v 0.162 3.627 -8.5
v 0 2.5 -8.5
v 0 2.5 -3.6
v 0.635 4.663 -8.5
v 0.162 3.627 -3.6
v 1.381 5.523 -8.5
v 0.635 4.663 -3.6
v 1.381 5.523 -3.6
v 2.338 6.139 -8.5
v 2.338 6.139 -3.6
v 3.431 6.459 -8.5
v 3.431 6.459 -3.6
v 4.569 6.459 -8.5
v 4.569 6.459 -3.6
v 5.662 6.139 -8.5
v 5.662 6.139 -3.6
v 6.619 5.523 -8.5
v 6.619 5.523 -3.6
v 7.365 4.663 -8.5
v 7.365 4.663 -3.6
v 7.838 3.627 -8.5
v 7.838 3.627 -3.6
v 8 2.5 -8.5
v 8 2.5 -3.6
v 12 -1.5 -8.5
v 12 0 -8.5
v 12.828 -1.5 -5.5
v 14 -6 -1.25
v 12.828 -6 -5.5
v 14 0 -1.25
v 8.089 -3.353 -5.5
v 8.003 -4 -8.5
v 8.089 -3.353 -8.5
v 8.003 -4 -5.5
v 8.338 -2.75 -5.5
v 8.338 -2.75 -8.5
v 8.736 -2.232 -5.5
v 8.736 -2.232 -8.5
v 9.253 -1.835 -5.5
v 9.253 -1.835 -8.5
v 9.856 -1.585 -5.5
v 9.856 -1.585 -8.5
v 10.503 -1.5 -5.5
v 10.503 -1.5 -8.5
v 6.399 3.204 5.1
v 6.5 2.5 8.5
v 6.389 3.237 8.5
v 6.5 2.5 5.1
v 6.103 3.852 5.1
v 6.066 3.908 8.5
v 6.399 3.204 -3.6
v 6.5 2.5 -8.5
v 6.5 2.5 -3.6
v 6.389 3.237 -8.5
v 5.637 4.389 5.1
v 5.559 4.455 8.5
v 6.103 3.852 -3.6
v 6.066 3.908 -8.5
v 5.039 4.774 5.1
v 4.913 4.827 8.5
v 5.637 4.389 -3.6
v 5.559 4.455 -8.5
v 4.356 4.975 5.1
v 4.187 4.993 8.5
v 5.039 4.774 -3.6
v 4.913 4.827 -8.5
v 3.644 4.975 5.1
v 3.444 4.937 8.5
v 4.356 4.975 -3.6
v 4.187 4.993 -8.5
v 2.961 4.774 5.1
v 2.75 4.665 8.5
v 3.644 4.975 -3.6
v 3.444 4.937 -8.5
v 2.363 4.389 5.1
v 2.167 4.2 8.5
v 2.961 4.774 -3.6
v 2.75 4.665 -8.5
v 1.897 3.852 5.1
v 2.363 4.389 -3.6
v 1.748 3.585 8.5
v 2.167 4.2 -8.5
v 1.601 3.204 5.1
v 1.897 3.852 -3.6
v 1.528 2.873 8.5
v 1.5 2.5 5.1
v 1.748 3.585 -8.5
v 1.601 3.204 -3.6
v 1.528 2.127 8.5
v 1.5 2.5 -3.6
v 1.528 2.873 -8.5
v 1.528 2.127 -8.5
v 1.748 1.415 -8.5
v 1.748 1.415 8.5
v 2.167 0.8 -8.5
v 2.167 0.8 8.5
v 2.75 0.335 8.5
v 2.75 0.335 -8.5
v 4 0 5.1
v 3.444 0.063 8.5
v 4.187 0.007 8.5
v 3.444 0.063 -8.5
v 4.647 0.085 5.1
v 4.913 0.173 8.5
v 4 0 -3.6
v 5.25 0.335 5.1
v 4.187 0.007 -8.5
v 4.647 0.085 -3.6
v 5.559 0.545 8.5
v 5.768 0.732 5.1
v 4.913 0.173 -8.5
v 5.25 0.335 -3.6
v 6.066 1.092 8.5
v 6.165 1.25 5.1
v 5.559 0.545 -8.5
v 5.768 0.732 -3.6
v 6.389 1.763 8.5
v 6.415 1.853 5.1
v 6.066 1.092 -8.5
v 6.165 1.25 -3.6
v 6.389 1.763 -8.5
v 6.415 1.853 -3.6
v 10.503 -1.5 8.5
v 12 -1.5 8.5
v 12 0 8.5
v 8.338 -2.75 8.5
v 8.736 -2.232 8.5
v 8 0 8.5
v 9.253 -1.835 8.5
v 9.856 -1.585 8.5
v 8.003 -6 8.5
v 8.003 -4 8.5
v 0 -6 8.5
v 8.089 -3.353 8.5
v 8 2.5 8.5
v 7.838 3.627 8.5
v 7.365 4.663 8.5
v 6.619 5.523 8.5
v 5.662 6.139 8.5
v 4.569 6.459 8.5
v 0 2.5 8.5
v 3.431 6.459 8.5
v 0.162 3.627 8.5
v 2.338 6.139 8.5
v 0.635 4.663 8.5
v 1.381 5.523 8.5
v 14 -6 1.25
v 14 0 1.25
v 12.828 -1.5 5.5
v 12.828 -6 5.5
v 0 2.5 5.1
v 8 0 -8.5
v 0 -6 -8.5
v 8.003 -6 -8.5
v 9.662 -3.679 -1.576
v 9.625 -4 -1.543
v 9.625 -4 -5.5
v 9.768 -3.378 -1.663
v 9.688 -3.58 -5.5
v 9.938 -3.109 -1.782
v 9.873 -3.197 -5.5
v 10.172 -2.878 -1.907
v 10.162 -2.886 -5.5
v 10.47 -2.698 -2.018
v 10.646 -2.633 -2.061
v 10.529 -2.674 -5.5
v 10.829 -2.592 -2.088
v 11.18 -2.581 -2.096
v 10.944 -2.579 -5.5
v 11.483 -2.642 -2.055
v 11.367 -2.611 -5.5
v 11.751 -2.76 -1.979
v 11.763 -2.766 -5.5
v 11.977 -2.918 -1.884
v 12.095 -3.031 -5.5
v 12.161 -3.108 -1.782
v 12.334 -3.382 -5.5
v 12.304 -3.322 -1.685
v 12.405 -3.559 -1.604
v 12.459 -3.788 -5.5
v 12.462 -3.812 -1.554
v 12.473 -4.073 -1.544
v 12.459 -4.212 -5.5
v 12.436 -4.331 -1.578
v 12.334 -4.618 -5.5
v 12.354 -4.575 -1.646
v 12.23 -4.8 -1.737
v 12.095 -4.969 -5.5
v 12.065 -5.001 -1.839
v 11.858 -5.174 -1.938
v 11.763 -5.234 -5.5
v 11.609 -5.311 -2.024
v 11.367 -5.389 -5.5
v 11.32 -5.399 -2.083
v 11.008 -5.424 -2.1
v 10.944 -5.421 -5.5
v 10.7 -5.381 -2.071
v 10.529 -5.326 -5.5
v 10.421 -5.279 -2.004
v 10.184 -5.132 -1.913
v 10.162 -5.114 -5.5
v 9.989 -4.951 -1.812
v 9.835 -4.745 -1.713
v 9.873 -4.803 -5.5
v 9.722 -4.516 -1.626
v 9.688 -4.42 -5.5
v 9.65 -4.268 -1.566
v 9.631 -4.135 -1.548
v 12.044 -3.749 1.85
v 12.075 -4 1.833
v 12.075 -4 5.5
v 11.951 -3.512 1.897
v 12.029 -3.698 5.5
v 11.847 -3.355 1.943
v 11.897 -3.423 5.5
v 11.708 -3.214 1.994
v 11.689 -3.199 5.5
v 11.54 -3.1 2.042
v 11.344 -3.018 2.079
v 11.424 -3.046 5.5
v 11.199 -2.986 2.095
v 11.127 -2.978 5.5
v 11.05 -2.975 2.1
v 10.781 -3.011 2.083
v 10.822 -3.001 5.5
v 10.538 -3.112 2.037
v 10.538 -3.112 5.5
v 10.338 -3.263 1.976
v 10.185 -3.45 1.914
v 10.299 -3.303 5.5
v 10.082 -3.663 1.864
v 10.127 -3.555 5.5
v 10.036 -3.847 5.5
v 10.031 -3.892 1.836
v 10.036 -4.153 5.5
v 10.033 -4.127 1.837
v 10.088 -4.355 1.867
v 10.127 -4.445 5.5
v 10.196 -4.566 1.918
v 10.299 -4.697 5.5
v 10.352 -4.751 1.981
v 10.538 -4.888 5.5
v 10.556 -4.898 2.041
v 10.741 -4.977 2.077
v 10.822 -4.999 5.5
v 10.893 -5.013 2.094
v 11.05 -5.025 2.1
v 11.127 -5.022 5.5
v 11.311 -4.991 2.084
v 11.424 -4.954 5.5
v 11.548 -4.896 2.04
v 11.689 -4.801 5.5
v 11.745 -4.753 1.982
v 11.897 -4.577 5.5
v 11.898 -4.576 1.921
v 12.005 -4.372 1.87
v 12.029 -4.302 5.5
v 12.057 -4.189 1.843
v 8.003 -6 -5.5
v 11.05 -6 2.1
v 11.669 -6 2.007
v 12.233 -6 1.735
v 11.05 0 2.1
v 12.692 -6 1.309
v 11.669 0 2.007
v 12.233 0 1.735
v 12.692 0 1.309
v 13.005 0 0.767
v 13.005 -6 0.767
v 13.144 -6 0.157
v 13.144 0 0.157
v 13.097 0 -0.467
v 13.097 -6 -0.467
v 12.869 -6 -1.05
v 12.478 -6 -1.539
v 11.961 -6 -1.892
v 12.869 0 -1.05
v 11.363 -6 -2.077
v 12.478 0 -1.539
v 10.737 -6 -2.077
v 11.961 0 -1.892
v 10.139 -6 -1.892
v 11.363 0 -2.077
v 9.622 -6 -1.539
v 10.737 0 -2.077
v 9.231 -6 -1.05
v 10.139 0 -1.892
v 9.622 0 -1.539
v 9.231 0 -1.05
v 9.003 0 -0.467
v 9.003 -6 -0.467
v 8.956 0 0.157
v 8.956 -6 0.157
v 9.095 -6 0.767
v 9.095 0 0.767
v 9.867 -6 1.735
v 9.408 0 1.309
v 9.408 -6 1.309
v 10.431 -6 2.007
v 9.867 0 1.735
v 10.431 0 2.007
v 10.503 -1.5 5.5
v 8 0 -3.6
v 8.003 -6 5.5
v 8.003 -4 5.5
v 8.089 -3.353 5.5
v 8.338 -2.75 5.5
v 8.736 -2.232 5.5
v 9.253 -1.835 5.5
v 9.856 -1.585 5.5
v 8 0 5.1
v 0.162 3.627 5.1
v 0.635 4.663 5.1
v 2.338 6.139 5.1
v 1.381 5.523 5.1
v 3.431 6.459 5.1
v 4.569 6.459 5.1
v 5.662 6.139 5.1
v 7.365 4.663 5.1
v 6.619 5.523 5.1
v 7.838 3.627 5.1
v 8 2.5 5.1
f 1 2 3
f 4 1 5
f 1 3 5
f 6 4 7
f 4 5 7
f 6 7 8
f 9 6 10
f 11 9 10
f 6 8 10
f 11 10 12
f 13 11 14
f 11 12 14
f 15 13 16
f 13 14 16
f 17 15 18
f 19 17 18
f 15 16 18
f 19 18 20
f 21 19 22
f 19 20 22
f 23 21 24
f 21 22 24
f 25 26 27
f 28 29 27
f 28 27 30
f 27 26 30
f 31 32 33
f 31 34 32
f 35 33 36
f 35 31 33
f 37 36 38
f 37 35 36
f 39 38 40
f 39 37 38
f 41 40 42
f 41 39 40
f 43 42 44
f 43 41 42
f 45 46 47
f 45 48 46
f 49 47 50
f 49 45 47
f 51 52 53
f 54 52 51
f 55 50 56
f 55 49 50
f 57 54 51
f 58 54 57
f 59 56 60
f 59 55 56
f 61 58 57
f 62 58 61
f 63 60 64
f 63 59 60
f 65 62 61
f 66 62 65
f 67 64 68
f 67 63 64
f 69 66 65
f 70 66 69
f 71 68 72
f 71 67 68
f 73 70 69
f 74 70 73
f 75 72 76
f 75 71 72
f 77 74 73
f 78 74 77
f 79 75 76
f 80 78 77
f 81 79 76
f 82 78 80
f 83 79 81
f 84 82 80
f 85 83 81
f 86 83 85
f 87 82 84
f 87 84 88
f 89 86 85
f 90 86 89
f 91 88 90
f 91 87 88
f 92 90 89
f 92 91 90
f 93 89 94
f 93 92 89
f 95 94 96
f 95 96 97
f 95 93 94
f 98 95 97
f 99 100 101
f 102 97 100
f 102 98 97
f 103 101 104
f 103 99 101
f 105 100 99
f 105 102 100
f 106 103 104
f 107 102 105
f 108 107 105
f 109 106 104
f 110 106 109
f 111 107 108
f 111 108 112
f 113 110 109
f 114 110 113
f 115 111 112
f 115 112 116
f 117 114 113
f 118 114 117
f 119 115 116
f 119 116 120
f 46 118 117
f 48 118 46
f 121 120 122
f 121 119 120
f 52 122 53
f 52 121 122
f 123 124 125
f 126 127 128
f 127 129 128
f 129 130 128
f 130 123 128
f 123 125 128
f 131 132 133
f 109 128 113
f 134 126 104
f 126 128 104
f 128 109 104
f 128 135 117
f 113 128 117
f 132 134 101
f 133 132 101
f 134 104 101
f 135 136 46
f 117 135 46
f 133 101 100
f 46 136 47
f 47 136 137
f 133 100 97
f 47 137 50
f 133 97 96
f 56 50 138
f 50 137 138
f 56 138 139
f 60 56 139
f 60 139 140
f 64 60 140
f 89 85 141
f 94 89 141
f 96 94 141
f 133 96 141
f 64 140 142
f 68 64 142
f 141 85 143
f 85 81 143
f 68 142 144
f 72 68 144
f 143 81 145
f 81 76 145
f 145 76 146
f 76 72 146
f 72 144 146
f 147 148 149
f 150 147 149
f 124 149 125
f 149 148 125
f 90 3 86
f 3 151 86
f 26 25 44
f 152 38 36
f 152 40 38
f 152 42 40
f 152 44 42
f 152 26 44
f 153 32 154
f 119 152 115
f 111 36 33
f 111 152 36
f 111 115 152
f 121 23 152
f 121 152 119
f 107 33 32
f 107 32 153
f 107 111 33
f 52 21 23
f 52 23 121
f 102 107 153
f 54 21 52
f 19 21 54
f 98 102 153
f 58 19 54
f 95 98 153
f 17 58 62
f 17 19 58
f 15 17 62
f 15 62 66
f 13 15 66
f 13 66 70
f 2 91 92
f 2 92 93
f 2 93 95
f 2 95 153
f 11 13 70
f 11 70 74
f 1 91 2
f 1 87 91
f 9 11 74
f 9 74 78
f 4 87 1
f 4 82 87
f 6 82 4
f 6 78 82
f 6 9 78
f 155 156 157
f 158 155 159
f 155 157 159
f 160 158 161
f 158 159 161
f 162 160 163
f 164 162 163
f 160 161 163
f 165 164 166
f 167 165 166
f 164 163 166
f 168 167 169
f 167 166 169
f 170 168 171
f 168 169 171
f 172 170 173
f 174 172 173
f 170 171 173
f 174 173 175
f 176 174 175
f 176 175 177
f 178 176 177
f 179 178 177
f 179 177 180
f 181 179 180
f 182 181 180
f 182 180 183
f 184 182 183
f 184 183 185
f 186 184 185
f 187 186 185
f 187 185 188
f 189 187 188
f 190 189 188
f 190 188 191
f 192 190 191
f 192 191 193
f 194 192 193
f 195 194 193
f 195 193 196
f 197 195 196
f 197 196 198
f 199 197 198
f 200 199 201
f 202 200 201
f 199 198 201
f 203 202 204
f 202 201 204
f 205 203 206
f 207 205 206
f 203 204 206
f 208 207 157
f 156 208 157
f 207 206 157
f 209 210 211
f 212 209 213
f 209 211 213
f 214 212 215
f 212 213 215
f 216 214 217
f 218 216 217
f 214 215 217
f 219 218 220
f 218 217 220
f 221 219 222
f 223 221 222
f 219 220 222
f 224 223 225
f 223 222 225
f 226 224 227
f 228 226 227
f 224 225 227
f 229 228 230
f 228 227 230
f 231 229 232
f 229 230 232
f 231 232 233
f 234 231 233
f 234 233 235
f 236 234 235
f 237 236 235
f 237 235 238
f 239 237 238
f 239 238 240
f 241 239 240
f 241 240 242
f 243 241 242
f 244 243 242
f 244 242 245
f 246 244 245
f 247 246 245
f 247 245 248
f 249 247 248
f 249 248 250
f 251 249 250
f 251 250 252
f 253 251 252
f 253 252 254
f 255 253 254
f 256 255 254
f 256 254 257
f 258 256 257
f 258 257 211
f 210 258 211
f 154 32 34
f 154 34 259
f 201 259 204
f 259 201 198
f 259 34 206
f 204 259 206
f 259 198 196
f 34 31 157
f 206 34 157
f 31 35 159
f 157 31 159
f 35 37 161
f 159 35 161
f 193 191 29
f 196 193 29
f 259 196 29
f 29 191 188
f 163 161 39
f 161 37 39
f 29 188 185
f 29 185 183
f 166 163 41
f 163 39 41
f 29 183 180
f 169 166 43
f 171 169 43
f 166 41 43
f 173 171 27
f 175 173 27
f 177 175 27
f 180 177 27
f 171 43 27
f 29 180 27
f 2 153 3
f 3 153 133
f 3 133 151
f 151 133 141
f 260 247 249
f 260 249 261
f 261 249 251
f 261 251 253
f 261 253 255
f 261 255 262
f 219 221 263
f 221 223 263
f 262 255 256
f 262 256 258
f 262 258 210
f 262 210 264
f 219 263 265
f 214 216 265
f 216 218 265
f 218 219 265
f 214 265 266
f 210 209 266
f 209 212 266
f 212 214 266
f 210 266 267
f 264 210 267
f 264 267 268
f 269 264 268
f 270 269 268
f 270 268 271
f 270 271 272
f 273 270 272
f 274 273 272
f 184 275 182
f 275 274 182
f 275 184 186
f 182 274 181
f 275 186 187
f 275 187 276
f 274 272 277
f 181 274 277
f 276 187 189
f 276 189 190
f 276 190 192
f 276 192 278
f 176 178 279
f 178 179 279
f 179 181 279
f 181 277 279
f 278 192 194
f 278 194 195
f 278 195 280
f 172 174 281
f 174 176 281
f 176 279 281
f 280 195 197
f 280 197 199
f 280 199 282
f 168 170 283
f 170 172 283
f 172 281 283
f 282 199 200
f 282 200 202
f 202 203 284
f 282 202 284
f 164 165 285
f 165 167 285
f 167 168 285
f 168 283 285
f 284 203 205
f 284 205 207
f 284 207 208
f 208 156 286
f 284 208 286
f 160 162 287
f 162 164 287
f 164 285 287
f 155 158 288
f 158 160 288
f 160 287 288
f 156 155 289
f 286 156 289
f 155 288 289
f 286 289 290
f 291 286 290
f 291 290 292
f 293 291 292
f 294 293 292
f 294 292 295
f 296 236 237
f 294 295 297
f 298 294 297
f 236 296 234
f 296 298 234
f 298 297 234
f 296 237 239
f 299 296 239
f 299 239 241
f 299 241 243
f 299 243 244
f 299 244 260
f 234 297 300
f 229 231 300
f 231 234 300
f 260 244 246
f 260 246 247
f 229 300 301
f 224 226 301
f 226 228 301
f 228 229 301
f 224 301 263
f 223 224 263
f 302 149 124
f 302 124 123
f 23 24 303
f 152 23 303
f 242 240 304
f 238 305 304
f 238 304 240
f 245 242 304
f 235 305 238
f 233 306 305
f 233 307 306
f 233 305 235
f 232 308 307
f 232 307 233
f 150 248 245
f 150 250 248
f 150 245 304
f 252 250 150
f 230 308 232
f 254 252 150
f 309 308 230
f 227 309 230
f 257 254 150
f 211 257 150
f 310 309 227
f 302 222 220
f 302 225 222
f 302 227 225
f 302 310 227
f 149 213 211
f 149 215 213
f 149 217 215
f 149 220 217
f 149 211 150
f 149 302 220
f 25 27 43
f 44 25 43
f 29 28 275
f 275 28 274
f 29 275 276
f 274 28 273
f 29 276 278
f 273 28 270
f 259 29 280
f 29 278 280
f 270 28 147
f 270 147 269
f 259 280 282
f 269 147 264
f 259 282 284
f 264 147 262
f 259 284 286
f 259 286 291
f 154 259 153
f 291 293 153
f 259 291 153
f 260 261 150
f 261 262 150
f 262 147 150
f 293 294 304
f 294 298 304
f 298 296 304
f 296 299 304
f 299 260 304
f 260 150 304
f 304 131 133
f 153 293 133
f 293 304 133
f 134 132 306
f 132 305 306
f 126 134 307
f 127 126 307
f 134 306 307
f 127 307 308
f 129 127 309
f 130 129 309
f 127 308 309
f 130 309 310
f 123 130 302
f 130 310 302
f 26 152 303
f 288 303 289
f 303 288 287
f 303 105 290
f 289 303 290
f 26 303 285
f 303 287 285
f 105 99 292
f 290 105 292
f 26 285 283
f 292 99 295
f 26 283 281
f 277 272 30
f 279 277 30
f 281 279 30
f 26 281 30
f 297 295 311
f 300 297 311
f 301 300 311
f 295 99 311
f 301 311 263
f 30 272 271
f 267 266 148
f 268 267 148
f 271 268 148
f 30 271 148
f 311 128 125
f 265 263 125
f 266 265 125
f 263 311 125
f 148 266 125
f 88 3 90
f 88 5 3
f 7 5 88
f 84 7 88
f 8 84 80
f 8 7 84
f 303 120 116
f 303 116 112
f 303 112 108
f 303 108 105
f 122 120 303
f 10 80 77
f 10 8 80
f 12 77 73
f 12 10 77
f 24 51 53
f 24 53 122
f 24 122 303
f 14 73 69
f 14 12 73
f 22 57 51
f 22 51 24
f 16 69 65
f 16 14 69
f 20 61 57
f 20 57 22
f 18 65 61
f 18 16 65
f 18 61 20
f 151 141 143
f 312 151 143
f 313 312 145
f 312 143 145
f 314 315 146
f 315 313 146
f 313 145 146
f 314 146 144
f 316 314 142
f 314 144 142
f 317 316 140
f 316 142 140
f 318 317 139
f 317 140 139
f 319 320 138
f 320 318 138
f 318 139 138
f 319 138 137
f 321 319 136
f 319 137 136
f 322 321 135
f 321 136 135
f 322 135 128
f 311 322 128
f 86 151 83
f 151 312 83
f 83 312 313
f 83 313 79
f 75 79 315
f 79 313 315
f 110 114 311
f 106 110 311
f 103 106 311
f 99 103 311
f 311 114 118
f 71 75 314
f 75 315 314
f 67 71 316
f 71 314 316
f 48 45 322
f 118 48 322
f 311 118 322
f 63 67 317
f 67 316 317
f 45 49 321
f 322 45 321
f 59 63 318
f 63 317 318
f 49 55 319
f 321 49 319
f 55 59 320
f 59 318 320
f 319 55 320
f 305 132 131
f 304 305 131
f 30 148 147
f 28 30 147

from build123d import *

# Parameters (mm, degrees)
SKETCH_1_R                = 2.5
EXTRUDE_1_DEPTH           = 8.5
CUT_EXTRUDE_1_DEPTH       = 17
CUT_EXTRUDE_2_DEPTH       = 3
FILLET_1_R                = 2.5
FILLET_1_OF_MIRROR_1_R    = 2.5
CUT_EXTRUDE_3_REACH       = 19.621
SKETCH_4_R                = 2.1
HOLE_WIZARD_M2_5_1_REACH  = 22.839
HOLE_WIZARD_M2_5_1_BORE_R = 1.025
CUT_EXTRUDE_4_REACH       = 22.839
CUT_EXTRUDE_4_END_RADIUS  = 2.1
SKETCH_9_R                = 1.425
CUT_EXTRUDE_5_DEPTH       = 5.1
CUT_EXTRUDE_6_DEPTH       = 3.6


with BuildPart() as part:
    # 草图1 → 凸台-拉伸1 (new, symmetric)
    with BuildSketch(Plane.XY):
        with BuildLine():
            Line((0, 0), (0, 2.5))
            ThreePointArc((0, 2.5), (4, 6.5), (8, 2.5))
            Line((8, 2.5), (8, 0))
            Line((8, 0), (14, 0))
            Line((14, 0), (14, -6))
            Line((14, -6), (0, -6))
            Line((0, -6), (0, 0))
        make_face()
        with Locations((4, 2.5)):
            Circle(SKETCH_1_R, mode=Mode.SUBTRACT)
    extrude(amount=EXTRUDE_1_DEPTH, both=True)

    # 草图2 → 切除-拉伸1 (cut)
    with BuildSketch(Plane(origin=(0, 0, 0), x_dir=(1, 0, 0), z_dir=(0, 1, 0))):
        Polygon((12, 8.5), (14, 1.25), (14, 8.5), align=None)
        Polygon((14, -8.5), (14, -1.25), (12, -8.5), align=None)
    extrude(amount=-CUT_EXTRUDE_1_DEPTH, mode=Mode.SUBTRACT)

    # 草图3 → 切除-拉伸2 (cut)
    with BuildSketch(Plane.XY.offset(8.5)):
        Polygon((12, -1.5), (8.003412896, -1.5), (8.003412896, -6), (8.003412896, -6.782168113), (14.44734693, -6.782168113), (14.44734693, -1.5), align=None)
    cut_extrude_2 = extrude(amount=-CUT_EXTRUDE_2_DEPTH, mode=Mode.SUBTRACT)

    # 圆角1
    fillet_1_edges = [part.edges().sort_by_distance(p)[0] for p in [
        (8.003412896, -1.5, 7),
    ]]
    fillet(fillet_1_edges, radius=FILLET_1_R)

    # 镜向1: 切除-拉伸2 across plane
    add(cut_extrude_2.mirror(Plane.XY), mode=Mode.SUBTRACT)

    # 圆角1 of 镜向1
    fillet_1_of_mirror_1_edges = [part.edges().sort_by_distance(p)[0] for p in [
        (8.003412896, -1.5, -7),
    ]]
    fillet(fillet_1_of_mirror_1_edges, radius=FILLET_1_OF_MIRROR_1_R)

    # 草图4 → 切除-拉伸3 (cut, up to next)
    with BuildSketch(Plane(origin=(0, 0, 0), x_dir=(1, 0, 0), z_dir=(0, 1, 0)), mode=Mode.PRIVATE) as cut_extrude_3_sk1:
        with Locations(Location((11.05, 0, 0), (0, 0, 270))):
            Circle(SKETCH_4_R)
    cut_extrude_3_tool1 = extrude(cut_extrude_3_sk1.sketch, amount=-CUT_EXTRUDE_3_REACH, mode=Mode.PRIVATE) & part.part
    add(cut_extrude_3_tool1.solids().sort_by_distance((11.05, 0, 0))[0], mode=Mode.SUBTRACT)

    # M2.5 螺纹孔1 bore → M2.5 螺纹孔1 (cut, up to next)
    with BuildSketch(Plane.XY.offset(5.5), mode=Mode.PRIVATE) as hole_wizard_m2_5_1_sk1:
        with Locations((11.05, -4)):
            Circle(HOLE_WIZARD_M2_5_1_BORE_R)
    hole_wizard_m2_5_1_tool1 = extrude(hole_wizard_m2_5_1_sk1.sketch, amount=-HOLE_WIZARD_M2_5_1_REACH, mode=Mode.PRIVATE) & part.part
    add(hole_wizard_m2_5_1_tool1.solids().sort_by_distance((11.05, -4, 5.5))[0], mode=Mode.SUBTRACT)

    # 切除-拉伸4: up to this cylinder (the profile starts outside it)
    cut_extrude_4_end = Plane(origin=(11.05, -4, 0), z_dir=(0, 1, 0)) * Cylinder(CUT_EXTRUDE_4_END_RADIUS, 50.878, mode=Mode.PRIVATE)
    # 草图9 → 切除-拉伸4 (cut, up to the surface)
    with BuildSketch(Plane(origin=(0, 0, -5.5), x_dir=(-1, 0, 0), z_dir=(0, 0, -1)), mode=Mode.PRIVATE) as cut_extrude_4_sk1:
        with Locations((-11.05, -4)):
            Circle(SKETCH_9_R)
    cut_extrude_4_tool1 = extrude(cut_extrude_4_sk1.sketch, amount=-CUT_EXTRUDE_4_REACH, mode=Mode.PRIVATE) - cut_extrude_4_end
    add(cut_extrude_4_tool1.solids().sort_by_distance((11.05, -4, -5.5))[0], mode=Mode.SUBTRACT)

    # 草图10 → 切除-拉伸5 (cut)
    with BuildSketch(Plane.XY):
        with BuildLine():
            Line((0, 2.5), (1.5, 2.5))
            ThreePointArc((1.5, 2.5), (5.767766953, 4.267766953), (4, 0))
            Line((4, 0), (8, 0))
            Line((8, 0), (8, 2.5))
            ThreePointArc((8, 2.5), (4, 6.5), (0, 2.5))
        make_face()
    extrude(amount=CUT_EXTRUDE_5_DEPTH, mode=Mode.SUBTRACT)

    # 草图10<2> → 切除-拉伸6 (cut)
    with BuildSketch(Plane.XY):
        with BuildLine():
            Line((0, 2.5), (1.5, 2.5))
            ThreePointArc((1.5, 2.5), (5.767766953, 4.267766953), (4, 0))
            Line((4, 0), (8, 0))
            Line((8, 0), (8, 2.5))
            ThreePointArc((8, 2.5), (4, 6.5), (0, 2.5))
        make_face()
    extrude(amount=-CUT_EXTRUDE_6_DEPTH, mode=Mode.SUBTRACT)


solid = part.part
